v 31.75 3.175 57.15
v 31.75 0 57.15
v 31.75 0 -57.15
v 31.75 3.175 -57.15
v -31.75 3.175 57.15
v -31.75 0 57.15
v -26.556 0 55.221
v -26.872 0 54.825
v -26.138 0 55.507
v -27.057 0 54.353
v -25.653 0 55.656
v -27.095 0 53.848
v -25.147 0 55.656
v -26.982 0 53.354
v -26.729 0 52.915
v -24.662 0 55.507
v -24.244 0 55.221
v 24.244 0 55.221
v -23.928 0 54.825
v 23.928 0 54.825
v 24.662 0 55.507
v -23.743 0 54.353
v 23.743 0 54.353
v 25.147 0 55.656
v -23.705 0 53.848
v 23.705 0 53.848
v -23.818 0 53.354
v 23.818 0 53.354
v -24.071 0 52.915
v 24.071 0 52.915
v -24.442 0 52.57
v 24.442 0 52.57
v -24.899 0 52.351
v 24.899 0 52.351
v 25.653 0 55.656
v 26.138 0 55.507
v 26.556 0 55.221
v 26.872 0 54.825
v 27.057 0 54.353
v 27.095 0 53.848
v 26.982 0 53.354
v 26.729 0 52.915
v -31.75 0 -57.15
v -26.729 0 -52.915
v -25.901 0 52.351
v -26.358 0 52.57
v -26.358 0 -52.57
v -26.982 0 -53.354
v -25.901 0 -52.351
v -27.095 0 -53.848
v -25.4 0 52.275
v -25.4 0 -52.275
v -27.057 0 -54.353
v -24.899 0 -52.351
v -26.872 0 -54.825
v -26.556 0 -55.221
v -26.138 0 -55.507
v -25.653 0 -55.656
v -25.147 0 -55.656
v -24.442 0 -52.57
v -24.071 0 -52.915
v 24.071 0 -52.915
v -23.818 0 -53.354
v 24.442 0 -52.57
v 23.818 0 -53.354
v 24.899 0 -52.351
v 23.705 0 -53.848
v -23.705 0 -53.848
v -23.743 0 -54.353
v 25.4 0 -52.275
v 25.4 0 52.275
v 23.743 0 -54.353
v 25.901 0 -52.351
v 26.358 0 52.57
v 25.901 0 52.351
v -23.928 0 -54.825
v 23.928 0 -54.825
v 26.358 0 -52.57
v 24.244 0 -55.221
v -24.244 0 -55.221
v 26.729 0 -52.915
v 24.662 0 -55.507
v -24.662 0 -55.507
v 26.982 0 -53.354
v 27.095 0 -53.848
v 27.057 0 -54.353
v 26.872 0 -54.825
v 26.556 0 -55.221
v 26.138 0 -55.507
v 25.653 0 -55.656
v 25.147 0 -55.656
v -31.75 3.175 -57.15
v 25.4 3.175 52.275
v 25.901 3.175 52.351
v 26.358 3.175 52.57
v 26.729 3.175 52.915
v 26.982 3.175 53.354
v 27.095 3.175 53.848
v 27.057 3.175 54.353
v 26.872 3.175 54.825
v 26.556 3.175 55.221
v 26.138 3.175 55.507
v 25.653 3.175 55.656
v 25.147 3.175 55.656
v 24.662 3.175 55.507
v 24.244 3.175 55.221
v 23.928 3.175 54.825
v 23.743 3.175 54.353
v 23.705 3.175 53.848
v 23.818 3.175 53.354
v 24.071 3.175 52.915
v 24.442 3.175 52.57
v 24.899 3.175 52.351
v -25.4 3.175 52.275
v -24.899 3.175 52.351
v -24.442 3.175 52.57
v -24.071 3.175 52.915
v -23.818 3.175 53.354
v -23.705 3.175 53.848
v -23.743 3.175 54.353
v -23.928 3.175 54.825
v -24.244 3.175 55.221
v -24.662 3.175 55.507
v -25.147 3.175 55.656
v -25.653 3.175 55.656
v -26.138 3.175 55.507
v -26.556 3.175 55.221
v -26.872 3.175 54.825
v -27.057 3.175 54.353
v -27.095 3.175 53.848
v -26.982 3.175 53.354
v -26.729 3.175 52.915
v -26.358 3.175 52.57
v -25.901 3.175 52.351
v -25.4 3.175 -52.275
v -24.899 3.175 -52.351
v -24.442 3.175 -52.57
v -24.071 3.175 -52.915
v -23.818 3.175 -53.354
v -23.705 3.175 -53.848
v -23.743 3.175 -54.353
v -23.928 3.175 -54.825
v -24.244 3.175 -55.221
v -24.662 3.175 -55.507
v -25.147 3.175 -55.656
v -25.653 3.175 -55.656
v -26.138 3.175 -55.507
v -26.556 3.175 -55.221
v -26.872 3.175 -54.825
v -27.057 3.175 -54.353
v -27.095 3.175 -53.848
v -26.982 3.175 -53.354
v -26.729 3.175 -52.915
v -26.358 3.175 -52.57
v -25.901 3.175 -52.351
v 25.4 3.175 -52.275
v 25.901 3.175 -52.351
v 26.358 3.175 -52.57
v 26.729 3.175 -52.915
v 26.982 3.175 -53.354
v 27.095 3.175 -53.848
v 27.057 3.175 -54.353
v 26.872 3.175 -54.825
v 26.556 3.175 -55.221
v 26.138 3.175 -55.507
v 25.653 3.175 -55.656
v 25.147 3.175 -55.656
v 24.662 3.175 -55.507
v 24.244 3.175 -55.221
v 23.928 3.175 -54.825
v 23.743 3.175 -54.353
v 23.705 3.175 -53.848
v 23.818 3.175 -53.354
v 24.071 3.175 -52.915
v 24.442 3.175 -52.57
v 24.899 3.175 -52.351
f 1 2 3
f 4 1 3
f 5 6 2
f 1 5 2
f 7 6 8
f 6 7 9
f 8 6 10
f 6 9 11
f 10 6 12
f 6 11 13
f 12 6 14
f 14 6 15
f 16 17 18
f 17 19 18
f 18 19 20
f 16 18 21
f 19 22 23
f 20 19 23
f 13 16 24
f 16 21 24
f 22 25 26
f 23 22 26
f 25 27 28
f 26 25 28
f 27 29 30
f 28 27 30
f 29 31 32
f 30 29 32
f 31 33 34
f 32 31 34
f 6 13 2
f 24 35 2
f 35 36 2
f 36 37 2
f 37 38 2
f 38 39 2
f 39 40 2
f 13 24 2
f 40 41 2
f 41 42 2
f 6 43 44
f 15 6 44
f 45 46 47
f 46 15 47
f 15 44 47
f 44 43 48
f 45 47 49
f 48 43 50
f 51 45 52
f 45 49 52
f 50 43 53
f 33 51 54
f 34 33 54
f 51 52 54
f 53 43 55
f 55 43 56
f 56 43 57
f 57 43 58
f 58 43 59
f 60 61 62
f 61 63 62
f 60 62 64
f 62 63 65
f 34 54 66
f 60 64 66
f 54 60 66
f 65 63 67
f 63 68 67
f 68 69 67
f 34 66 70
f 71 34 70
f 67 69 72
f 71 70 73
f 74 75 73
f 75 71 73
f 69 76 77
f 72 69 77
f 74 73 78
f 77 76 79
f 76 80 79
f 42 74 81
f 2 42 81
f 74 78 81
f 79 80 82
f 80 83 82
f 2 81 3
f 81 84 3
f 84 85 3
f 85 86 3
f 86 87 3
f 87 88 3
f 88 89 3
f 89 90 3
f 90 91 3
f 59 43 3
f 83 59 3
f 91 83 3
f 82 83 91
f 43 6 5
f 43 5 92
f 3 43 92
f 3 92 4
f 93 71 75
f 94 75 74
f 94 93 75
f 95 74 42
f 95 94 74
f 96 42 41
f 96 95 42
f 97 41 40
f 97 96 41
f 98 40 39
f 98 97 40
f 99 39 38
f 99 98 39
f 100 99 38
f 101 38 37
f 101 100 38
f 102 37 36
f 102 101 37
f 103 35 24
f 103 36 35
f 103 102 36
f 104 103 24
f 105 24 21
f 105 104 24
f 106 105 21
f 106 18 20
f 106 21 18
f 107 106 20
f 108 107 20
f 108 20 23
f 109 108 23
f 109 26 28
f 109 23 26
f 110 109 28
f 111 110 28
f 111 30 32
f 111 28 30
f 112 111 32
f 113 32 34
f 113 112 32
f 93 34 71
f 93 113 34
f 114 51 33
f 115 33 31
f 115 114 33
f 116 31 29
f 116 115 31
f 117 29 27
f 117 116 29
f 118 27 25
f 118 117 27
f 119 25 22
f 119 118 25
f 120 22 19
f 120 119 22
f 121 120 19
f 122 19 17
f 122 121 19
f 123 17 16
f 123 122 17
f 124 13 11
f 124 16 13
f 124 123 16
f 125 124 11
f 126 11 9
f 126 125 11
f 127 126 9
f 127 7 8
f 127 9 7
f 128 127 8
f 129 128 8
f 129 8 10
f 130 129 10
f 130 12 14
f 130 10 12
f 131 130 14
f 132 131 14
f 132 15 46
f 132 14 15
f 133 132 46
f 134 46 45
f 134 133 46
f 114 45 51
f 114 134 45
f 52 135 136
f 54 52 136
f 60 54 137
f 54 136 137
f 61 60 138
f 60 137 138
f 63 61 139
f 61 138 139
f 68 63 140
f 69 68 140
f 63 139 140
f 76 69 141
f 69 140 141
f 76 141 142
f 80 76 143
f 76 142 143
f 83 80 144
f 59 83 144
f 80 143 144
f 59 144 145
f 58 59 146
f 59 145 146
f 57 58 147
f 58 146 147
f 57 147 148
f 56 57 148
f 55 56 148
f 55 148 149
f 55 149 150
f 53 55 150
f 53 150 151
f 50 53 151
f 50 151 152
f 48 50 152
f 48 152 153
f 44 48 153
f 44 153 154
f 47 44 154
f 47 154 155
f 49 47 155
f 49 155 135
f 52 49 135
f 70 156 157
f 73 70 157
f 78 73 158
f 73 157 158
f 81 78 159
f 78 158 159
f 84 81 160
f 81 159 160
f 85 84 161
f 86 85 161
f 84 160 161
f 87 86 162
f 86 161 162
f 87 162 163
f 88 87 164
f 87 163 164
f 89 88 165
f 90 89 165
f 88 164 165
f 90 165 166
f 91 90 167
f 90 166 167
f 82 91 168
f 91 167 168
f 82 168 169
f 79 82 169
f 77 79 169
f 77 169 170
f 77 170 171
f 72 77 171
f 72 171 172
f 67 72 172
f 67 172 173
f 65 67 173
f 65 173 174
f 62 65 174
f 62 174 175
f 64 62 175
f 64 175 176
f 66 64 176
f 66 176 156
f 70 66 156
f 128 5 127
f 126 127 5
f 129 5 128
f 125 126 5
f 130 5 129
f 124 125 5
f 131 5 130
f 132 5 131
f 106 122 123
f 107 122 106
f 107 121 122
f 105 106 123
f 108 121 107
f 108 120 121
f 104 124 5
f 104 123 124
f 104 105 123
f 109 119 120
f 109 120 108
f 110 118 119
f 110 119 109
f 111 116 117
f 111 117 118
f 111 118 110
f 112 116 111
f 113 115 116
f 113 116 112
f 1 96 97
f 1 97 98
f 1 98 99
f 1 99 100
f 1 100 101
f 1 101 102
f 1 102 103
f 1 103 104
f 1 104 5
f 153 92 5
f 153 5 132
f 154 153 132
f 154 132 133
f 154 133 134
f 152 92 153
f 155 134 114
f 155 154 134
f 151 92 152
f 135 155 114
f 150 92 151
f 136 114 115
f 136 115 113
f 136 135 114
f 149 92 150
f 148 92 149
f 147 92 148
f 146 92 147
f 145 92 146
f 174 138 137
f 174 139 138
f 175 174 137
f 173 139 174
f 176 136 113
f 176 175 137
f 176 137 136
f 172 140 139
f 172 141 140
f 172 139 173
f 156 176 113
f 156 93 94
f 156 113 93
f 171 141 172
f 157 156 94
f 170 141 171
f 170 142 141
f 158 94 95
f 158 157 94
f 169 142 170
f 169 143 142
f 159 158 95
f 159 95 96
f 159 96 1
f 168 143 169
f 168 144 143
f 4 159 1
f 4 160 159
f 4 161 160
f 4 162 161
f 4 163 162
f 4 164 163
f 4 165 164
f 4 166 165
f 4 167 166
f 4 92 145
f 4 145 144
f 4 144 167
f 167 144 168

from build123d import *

# Parameters (mm, degrees)
SKETCH1_W           = 63.5
SKETCH1_H           = 114.3
BOSS_EXTRUDE1_DEPTH = 3.175
SKETCH2_R           = 1.7
CUT_EXTRUDE1_DEPTH  = 66.454301807


with BuildPart() as part:
    # Sketch1 → Boss-Extrude1 (new body)
    with BuildSketch(Plane(origin=(0, 0, 0), x_dir=(1, 0, 0), z_dir=(0, 1, 0))):
        Rectangle(SKETCH1_W, SKETCH1_H)
    extrude(amount=BOSS_EXTRUDE1_DEPTH)

    # Sketch2 → Cut-Extrude1 (cut, through all)
    with BuildSketch(Plane(origin=(0, 3.175, 0), x_dir=(1, 0, 0), z_dir=(0, 1, 0))):
        with Locations(Location((-25.4, 53.975, 0), (0, 0, 270))):
            Circle(SKETCH2_R)
        with Locations(Location((25.4, 53.975, 0), (0, 0, 270))):
            Circle(SKETCH2_R)
    cut_extrude1 = extrude(amount=-CUT_EXTRUDE1_DEPTH, mode=Mode.SUBTRACT)

    # Mirror1: Cut-Extrude1 across plane
    add(cut_extrude1.mirror(Plane.XY), mode=Mode.SUBTRACT)


solid = part.part
